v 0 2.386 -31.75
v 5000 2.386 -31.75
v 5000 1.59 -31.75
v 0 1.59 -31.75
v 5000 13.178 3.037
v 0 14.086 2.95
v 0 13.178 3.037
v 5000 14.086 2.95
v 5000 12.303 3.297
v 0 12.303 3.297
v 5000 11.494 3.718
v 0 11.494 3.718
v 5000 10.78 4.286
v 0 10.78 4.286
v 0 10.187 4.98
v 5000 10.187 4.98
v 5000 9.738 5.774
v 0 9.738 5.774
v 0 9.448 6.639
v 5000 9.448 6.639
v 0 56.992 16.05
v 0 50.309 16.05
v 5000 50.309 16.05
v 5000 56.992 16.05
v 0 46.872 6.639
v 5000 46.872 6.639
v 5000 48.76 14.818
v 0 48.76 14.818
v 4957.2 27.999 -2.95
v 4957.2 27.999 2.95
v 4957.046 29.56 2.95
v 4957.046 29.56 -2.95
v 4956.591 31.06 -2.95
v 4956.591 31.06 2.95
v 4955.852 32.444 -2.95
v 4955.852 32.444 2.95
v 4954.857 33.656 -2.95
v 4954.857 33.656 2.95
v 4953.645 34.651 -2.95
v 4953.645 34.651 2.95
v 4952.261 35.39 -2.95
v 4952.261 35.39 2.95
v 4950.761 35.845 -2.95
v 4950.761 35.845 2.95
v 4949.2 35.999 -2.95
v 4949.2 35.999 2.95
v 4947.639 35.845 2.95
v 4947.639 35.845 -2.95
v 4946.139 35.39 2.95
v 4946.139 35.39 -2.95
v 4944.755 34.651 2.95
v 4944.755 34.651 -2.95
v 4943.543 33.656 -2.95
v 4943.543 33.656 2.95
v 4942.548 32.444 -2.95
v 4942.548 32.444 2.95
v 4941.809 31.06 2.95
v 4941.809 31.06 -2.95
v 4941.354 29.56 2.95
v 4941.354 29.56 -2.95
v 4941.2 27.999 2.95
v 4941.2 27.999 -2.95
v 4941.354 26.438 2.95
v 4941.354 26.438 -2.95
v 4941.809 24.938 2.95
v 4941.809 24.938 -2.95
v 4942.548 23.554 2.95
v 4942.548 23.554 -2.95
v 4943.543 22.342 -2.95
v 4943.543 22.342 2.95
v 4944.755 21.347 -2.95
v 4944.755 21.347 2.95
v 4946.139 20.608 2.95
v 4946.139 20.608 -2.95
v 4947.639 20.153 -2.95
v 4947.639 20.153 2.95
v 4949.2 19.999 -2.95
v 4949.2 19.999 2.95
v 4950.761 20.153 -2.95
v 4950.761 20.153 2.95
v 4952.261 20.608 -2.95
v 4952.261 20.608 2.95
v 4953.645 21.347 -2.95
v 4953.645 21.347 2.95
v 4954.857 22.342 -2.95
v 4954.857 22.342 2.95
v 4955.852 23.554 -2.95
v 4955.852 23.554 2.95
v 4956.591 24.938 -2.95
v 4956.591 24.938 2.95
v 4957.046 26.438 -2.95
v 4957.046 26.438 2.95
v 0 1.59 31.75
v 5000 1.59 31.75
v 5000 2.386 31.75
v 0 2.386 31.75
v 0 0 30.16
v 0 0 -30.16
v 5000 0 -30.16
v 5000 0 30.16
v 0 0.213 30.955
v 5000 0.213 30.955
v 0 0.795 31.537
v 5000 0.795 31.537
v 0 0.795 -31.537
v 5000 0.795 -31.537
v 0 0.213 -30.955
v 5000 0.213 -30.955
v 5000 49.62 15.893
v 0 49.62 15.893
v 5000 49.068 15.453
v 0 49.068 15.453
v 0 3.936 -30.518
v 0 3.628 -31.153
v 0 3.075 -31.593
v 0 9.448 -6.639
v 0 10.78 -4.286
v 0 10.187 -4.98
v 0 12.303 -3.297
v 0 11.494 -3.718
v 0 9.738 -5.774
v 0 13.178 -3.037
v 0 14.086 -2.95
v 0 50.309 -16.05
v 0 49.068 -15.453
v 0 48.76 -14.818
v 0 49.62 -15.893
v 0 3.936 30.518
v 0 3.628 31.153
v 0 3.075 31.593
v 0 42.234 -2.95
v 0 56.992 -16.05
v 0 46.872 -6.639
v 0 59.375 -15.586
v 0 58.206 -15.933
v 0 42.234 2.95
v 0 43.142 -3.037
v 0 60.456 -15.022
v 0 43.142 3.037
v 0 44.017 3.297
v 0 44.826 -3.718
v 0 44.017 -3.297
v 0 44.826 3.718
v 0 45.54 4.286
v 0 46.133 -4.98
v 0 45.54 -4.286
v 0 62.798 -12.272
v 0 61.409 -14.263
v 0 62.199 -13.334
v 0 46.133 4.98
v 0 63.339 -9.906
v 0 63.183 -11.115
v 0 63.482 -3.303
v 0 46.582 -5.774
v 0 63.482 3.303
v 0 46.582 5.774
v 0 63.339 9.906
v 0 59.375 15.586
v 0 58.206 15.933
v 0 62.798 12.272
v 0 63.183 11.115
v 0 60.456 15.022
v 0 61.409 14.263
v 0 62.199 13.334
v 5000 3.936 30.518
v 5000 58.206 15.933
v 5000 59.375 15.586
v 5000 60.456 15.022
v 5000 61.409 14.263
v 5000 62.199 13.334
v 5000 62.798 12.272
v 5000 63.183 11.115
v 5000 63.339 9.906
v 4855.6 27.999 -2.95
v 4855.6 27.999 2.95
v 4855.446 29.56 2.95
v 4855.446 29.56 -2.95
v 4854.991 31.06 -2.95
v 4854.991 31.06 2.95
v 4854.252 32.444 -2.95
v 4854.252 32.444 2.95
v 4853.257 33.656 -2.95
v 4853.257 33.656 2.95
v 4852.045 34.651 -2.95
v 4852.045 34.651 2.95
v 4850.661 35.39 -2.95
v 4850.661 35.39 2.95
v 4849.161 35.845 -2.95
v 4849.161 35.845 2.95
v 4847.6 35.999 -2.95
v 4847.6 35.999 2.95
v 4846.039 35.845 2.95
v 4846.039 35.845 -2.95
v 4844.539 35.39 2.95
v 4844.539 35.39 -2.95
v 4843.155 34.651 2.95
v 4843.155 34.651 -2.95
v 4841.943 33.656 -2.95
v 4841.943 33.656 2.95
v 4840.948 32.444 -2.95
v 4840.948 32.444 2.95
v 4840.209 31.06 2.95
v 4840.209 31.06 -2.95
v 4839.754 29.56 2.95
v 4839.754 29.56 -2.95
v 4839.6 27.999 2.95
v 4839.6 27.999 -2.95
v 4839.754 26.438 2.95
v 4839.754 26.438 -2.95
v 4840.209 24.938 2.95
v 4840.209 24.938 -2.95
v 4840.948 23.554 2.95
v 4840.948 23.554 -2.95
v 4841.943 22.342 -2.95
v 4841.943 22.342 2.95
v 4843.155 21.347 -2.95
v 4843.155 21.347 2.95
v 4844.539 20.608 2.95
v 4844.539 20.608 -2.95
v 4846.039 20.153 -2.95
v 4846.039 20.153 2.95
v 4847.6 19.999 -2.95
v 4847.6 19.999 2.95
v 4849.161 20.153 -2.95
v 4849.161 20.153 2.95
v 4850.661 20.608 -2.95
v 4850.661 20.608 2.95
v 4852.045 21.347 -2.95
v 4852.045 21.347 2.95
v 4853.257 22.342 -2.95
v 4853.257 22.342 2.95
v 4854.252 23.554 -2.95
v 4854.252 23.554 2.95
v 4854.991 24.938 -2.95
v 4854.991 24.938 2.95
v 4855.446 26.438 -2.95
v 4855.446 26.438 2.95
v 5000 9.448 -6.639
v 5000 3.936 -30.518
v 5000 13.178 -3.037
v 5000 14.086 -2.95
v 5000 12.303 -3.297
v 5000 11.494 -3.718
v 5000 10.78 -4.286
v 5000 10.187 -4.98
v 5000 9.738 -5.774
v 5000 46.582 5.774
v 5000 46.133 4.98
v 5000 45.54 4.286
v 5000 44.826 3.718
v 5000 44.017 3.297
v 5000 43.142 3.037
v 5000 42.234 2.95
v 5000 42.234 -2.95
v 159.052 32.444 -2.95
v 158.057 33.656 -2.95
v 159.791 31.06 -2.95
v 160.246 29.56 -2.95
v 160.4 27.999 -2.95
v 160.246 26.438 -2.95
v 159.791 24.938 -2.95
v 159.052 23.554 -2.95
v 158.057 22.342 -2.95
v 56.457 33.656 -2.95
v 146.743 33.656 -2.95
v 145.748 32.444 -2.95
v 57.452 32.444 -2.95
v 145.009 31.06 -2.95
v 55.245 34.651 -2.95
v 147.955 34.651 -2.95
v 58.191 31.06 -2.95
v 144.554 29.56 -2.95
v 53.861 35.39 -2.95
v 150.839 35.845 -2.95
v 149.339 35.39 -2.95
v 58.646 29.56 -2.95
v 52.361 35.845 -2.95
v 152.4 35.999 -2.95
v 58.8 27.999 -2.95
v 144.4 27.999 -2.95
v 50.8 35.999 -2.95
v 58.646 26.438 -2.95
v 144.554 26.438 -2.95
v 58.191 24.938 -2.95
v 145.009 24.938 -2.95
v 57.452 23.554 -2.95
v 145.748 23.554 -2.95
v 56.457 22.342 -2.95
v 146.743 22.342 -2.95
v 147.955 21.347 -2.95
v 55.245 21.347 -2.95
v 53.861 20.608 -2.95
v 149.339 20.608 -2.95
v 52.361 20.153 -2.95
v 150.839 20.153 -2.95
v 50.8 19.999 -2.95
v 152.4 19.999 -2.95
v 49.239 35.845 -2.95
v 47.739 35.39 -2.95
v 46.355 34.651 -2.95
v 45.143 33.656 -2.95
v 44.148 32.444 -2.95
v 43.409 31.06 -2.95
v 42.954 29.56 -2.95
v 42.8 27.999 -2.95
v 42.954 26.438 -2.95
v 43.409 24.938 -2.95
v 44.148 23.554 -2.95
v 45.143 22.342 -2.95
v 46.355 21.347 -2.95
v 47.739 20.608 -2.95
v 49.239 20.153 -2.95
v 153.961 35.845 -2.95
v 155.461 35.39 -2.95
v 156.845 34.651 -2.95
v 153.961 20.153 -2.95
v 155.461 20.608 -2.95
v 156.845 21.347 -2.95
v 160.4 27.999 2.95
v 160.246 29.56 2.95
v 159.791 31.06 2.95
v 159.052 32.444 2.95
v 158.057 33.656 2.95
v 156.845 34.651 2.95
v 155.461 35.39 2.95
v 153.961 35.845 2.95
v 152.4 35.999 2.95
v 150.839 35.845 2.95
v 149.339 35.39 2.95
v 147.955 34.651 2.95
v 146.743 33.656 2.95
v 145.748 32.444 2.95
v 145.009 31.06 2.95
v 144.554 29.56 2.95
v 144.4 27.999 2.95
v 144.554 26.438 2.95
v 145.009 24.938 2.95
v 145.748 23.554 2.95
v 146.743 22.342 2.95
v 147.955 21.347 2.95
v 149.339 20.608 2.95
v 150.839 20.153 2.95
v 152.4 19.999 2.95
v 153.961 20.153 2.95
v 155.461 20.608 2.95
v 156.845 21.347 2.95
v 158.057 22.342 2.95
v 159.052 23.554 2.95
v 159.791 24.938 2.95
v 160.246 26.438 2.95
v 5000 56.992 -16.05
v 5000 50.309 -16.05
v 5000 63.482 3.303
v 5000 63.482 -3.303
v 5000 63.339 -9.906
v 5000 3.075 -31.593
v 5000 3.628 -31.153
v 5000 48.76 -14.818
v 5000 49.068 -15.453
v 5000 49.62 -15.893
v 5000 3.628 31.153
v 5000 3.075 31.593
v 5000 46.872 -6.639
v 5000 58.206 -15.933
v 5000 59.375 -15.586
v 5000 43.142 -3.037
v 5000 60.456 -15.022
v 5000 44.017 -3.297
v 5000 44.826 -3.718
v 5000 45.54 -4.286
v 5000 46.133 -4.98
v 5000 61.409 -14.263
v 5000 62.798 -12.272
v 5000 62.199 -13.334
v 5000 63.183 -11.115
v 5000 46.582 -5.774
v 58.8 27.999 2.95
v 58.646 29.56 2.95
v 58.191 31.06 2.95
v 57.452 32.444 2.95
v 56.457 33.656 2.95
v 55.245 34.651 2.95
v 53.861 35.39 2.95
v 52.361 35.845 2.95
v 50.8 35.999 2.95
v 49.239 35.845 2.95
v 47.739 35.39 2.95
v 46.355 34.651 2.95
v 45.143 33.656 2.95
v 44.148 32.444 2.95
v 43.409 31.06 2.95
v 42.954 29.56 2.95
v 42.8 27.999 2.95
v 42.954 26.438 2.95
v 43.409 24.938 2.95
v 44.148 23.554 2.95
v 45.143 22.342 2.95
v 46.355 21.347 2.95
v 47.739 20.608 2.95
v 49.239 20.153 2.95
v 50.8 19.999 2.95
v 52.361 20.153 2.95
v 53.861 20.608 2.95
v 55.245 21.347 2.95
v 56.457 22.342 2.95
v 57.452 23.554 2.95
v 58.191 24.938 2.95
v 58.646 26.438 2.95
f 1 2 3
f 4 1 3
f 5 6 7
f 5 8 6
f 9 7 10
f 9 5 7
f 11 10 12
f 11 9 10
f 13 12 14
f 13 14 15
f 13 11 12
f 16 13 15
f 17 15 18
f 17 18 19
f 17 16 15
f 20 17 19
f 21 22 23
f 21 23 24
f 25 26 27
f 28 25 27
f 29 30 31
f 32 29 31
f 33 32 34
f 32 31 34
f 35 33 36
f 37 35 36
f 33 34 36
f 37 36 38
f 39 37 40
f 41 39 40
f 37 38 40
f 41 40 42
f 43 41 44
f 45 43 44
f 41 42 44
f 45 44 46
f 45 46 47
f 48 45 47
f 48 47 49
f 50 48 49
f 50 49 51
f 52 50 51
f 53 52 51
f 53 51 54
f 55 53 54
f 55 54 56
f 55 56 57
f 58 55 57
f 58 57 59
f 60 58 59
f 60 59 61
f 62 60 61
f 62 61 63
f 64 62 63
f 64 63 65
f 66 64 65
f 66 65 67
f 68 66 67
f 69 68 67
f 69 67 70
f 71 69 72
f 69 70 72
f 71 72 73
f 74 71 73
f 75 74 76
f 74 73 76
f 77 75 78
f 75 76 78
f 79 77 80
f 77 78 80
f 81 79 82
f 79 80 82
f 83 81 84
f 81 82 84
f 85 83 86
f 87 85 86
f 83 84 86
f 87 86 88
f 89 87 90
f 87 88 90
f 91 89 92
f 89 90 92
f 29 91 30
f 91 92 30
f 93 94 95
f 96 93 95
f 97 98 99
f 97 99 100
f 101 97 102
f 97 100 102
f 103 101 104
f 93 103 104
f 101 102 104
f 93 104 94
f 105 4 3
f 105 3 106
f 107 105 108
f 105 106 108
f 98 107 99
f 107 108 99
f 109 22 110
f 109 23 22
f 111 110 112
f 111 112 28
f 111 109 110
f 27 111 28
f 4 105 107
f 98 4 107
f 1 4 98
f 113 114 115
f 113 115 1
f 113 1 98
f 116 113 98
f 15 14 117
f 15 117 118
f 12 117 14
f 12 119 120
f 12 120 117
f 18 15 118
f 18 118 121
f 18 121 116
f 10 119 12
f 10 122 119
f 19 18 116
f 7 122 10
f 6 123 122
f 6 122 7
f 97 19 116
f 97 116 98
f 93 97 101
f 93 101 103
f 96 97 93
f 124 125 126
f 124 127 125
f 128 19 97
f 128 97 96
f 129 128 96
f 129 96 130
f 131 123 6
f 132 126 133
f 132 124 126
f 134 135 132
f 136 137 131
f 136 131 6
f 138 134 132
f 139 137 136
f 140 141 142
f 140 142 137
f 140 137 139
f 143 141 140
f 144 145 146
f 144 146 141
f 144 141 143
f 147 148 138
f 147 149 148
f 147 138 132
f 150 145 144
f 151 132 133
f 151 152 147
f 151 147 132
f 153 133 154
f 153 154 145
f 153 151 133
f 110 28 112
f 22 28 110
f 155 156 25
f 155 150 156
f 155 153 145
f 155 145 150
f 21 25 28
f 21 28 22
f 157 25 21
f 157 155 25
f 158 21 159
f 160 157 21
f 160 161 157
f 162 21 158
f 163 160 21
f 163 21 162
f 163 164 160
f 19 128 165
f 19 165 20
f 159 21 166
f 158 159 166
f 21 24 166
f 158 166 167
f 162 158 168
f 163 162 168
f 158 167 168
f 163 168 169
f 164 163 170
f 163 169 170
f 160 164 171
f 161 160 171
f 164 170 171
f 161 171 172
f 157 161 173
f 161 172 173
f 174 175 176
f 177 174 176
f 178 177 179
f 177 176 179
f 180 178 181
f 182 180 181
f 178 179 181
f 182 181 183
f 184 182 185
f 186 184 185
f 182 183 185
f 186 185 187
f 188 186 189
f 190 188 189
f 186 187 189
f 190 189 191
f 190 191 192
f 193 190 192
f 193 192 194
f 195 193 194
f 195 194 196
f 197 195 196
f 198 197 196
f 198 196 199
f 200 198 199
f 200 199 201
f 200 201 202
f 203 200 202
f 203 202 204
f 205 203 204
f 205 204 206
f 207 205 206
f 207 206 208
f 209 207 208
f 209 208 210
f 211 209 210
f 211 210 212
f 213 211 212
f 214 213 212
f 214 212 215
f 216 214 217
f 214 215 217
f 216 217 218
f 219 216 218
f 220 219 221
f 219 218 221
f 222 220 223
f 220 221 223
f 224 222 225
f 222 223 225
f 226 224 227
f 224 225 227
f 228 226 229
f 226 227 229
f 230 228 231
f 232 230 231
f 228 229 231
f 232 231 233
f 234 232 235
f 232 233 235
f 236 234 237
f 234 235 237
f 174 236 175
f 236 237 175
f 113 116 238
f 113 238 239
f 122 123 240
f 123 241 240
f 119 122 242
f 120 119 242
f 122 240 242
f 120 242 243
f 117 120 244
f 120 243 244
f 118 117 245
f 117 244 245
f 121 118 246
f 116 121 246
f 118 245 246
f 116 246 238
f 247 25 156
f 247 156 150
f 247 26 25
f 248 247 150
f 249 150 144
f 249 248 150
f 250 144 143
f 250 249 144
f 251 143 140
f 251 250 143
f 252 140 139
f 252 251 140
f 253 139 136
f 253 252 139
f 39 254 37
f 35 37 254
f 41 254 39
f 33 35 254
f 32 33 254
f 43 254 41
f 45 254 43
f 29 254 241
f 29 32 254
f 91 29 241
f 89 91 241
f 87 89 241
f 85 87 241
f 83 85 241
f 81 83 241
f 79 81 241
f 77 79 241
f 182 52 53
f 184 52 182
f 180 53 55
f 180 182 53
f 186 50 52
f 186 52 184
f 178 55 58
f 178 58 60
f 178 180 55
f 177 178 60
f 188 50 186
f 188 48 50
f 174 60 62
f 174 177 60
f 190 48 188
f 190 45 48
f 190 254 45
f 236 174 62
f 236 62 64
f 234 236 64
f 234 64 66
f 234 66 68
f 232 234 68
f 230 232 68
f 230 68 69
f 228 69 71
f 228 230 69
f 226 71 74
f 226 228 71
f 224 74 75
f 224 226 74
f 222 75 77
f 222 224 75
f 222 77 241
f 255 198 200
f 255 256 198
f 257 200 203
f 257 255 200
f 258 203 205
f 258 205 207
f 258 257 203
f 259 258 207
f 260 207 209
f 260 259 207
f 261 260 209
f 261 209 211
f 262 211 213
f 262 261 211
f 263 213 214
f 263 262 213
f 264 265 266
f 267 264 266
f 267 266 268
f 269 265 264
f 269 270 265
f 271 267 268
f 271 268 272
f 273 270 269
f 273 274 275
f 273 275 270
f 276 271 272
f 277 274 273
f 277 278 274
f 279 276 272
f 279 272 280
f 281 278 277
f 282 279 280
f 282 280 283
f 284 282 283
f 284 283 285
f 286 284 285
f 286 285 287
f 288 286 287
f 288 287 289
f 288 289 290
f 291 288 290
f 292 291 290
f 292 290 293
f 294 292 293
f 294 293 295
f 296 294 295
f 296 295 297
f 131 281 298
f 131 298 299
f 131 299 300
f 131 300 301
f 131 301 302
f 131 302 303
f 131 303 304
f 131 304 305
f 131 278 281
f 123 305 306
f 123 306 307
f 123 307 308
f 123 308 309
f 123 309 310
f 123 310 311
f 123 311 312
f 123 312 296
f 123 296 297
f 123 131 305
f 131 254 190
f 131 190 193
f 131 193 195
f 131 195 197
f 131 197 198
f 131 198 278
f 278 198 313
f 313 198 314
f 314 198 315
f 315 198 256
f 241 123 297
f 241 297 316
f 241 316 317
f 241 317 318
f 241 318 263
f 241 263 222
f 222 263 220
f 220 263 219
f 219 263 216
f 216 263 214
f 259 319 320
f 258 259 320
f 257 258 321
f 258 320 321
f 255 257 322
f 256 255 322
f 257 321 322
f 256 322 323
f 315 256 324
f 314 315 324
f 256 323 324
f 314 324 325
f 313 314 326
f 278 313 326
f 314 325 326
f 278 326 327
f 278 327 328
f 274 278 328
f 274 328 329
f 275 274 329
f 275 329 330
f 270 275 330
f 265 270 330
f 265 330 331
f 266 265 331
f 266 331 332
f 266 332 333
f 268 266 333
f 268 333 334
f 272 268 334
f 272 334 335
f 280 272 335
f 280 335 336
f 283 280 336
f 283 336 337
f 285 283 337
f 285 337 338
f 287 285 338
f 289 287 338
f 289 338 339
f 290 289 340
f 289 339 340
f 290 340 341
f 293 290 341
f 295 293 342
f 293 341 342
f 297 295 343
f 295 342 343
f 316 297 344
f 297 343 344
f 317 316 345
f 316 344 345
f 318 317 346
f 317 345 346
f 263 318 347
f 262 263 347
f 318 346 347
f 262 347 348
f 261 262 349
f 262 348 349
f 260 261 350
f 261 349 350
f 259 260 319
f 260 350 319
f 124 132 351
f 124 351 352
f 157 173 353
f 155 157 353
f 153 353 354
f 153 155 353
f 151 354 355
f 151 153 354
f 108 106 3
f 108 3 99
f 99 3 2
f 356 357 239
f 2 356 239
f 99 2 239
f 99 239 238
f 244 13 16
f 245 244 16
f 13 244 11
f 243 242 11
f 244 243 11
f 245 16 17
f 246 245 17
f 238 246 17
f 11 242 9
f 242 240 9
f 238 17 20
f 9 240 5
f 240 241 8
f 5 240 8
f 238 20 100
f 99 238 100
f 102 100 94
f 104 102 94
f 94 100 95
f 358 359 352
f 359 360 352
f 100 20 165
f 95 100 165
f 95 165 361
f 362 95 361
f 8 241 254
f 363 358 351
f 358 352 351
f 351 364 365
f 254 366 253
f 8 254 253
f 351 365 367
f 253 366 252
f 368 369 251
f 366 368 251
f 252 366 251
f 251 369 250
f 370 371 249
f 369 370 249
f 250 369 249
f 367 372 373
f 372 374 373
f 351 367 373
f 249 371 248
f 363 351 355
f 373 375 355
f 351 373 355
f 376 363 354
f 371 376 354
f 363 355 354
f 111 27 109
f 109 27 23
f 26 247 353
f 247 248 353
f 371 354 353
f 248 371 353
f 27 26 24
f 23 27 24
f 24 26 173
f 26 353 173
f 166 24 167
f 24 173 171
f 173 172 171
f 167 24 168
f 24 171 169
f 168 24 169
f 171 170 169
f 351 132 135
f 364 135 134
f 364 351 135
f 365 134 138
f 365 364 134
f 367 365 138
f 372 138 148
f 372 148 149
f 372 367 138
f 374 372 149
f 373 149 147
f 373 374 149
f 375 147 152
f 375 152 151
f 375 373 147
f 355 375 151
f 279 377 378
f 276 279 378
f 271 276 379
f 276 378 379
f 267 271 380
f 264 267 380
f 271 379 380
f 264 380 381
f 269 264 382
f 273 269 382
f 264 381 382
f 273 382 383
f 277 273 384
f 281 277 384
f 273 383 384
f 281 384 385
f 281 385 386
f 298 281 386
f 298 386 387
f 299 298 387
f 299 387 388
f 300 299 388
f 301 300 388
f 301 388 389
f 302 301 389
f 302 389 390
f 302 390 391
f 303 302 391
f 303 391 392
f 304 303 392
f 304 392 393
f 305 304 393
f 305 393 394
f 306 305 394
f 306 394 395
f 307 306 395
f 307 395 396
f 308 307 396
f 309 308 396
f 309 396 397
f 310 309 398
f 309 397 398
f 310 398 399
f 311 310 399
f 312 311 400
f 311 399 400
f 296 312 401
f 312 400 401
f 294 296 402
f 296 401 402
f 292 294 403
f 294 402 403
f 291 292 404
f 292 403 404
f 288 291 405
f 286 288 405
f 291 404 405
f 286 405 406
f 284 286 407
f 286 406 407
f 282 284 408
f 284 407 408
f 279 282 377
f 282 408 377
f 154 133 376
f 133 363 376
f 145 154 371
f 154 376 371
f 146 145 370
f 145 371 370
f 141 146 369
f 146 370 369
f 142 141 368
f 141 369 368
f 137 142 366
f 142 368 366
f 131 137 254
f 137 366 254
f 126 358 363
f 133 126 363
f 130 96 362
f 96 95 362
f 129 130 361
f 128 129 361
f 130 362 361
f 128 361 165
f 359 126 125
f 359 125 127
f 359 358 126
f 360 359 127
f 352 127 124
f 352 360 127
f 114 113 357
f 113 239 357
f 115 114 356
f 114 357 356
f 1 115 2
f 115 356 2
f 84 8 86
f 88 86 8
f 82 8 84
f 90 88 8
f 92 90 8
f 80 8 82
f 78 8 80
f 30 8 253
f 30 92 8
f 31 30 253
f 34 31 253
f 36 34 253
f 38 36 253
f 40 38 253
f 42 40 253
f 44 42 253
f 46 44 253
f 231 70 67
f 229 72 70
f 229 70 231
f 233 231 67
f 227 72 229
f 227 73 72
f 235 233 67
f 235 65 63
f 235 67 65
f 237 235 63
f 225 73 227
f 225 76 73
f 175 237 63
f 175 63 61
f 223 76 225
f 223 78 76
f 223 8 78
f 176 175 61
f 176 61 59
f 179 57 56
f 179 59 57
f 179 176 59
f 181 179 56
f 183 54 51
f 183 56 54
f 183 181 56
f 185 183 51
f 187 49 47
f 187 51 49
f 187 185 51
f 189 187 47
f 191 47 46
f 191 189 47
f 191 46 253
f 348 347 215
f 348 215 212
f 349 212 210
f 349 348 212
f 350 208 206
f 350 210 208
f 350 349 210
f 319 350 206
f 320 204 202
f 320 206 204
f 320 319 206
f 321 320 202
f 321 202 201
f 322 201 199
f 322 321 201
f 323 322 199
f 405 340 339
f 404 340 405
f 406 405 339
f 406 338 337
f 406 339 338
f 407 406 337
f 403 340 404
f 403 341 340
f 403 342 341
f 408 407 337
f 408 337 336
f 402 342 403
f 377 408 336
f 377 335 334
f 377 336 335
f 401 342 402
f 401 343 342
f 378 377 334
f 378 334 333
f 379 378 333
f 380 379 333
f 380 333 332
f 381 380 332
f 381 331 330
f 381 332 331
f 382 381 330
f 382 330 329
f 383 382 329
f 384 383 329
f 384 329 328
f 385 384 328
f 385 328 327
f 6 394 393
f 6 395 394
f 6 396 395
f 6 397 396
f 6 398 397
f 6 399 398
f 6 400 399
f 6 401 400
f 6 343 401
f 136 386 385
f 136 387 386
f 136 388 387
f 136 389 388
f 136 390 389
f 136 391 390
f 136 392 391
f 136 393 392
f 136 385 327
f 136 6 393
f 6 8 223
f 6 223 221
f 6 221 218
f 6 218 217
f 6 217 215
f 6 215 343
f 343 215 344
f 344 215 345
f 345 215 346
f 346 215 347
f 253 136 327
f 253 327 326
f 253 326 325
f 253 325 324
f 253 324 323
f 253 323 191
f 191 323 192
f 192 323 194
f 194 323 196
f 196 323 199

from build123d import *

# Parameters (mm, degrees)
BASE_DEPTH         = 5000
FILLET1_R          = 6.35
FILLET2_R          = 4.76
FILLET3_R          = 1.59
SKETCH2_R          = 8
CUT_EXTRUDE1_DEPTH = 4584.729758915


with BuildPart() as part:
    # Sketch1 → Base (new body)
    with BuildSketch(Plane(origin=(0, 0, 0), x_dir=(0, 0, -1), z_dir=(1, 0, 0))):
        with BuildLine():
            Line((16.05, 63.077130383), (16.05, 49.044373304))
            Line((16.05, 49.044373304), (2.95, 46.02))
            Line((2.95, 46.02), (2.95, 10.3))
            Line((2.95, 10.3), (31.75, 3.650996096))
            Line((31.75, 3.650996096), (31.75, 0))
            Line((31.75, 0), (-31.75, 0))
            Line((-31.75, 0), (-31.75, 3.650996096))
            Line((-31.75, 3.650996096), (-2.95, 10.3))
            Line((-2.95, 10.3), (-2.95, 46.02))
            Line((-2.95, 46.02), (-16.05, 49.044373304))
            Line((-16.05, 49.044373304), (-16.05, 63.077130383))
            ThreePointArc((-16.05, 63.077130383), (0, 63.5), (16.05, 63.077130383))
        make_face()
    extrude(amount=BASE_DEPTH)

    # Fillet1
    fillet1_edges = [part.edges().sort_by_distance(p)[0] for p in [
        (2500, 63.077130383, -16.05),
        (2500, 63.077130383, 16.05),
    ]]
    fillet(fillet1_edges, radius=FILLET1_R)

    # Fillet2
    fillet2_edges = [part.edges().sort_by_distance(p)[0] for p in [
        (2500, 46.02, -2.95),
        (2500, 10.3, -2.95),
        (2500, 10.3, 2.95),
        (2500, 46.02, 2.95),
    ]]
    fillet(fillet2_edges, radius=FILLET2_R)

    # Fillet3
    fillet3_edges = [part.edges().sort_by_distance(p)[0] for p in [
        (2500, 49.044373304, -16.05),
        (2500, 3.650996096, -31.75),
        (2500, 0, -31.75),
        (2500, 0, 31.75),
        (2500, 3.650996096, 31.75),
        (2500, 49.044373304, 16.05),
    ]]
    fillet(fillet3_edges, radius=FILLET3_R)

    # Sketch2 → Cut-Extrude1 (cut, through all)
    with BuildSketch(Plane(origin=(416.890903054, -3.473265232, 2.95), x_dir=(1, 0, 0), z_dir=(0, 0, 1))):
        with Locations((-366.090903054, 31.472237749)):
            Circle(SKETCH2_R)
        with Locations((-264.490903054, 31.472237749)):
            Circle(SKETCH2_R)
        with Locations((4430.709096946, 31.472237749)):
            Circle(SKETCH2_R)
        with Locations((4532.309096946, 31.472237749)):
            Circle(SKETCH2_R)
    extrude(amount=-CUT_EXTRUDE1_DEPTH, mode=Mode.SUBTRACT)


solid = part.part
